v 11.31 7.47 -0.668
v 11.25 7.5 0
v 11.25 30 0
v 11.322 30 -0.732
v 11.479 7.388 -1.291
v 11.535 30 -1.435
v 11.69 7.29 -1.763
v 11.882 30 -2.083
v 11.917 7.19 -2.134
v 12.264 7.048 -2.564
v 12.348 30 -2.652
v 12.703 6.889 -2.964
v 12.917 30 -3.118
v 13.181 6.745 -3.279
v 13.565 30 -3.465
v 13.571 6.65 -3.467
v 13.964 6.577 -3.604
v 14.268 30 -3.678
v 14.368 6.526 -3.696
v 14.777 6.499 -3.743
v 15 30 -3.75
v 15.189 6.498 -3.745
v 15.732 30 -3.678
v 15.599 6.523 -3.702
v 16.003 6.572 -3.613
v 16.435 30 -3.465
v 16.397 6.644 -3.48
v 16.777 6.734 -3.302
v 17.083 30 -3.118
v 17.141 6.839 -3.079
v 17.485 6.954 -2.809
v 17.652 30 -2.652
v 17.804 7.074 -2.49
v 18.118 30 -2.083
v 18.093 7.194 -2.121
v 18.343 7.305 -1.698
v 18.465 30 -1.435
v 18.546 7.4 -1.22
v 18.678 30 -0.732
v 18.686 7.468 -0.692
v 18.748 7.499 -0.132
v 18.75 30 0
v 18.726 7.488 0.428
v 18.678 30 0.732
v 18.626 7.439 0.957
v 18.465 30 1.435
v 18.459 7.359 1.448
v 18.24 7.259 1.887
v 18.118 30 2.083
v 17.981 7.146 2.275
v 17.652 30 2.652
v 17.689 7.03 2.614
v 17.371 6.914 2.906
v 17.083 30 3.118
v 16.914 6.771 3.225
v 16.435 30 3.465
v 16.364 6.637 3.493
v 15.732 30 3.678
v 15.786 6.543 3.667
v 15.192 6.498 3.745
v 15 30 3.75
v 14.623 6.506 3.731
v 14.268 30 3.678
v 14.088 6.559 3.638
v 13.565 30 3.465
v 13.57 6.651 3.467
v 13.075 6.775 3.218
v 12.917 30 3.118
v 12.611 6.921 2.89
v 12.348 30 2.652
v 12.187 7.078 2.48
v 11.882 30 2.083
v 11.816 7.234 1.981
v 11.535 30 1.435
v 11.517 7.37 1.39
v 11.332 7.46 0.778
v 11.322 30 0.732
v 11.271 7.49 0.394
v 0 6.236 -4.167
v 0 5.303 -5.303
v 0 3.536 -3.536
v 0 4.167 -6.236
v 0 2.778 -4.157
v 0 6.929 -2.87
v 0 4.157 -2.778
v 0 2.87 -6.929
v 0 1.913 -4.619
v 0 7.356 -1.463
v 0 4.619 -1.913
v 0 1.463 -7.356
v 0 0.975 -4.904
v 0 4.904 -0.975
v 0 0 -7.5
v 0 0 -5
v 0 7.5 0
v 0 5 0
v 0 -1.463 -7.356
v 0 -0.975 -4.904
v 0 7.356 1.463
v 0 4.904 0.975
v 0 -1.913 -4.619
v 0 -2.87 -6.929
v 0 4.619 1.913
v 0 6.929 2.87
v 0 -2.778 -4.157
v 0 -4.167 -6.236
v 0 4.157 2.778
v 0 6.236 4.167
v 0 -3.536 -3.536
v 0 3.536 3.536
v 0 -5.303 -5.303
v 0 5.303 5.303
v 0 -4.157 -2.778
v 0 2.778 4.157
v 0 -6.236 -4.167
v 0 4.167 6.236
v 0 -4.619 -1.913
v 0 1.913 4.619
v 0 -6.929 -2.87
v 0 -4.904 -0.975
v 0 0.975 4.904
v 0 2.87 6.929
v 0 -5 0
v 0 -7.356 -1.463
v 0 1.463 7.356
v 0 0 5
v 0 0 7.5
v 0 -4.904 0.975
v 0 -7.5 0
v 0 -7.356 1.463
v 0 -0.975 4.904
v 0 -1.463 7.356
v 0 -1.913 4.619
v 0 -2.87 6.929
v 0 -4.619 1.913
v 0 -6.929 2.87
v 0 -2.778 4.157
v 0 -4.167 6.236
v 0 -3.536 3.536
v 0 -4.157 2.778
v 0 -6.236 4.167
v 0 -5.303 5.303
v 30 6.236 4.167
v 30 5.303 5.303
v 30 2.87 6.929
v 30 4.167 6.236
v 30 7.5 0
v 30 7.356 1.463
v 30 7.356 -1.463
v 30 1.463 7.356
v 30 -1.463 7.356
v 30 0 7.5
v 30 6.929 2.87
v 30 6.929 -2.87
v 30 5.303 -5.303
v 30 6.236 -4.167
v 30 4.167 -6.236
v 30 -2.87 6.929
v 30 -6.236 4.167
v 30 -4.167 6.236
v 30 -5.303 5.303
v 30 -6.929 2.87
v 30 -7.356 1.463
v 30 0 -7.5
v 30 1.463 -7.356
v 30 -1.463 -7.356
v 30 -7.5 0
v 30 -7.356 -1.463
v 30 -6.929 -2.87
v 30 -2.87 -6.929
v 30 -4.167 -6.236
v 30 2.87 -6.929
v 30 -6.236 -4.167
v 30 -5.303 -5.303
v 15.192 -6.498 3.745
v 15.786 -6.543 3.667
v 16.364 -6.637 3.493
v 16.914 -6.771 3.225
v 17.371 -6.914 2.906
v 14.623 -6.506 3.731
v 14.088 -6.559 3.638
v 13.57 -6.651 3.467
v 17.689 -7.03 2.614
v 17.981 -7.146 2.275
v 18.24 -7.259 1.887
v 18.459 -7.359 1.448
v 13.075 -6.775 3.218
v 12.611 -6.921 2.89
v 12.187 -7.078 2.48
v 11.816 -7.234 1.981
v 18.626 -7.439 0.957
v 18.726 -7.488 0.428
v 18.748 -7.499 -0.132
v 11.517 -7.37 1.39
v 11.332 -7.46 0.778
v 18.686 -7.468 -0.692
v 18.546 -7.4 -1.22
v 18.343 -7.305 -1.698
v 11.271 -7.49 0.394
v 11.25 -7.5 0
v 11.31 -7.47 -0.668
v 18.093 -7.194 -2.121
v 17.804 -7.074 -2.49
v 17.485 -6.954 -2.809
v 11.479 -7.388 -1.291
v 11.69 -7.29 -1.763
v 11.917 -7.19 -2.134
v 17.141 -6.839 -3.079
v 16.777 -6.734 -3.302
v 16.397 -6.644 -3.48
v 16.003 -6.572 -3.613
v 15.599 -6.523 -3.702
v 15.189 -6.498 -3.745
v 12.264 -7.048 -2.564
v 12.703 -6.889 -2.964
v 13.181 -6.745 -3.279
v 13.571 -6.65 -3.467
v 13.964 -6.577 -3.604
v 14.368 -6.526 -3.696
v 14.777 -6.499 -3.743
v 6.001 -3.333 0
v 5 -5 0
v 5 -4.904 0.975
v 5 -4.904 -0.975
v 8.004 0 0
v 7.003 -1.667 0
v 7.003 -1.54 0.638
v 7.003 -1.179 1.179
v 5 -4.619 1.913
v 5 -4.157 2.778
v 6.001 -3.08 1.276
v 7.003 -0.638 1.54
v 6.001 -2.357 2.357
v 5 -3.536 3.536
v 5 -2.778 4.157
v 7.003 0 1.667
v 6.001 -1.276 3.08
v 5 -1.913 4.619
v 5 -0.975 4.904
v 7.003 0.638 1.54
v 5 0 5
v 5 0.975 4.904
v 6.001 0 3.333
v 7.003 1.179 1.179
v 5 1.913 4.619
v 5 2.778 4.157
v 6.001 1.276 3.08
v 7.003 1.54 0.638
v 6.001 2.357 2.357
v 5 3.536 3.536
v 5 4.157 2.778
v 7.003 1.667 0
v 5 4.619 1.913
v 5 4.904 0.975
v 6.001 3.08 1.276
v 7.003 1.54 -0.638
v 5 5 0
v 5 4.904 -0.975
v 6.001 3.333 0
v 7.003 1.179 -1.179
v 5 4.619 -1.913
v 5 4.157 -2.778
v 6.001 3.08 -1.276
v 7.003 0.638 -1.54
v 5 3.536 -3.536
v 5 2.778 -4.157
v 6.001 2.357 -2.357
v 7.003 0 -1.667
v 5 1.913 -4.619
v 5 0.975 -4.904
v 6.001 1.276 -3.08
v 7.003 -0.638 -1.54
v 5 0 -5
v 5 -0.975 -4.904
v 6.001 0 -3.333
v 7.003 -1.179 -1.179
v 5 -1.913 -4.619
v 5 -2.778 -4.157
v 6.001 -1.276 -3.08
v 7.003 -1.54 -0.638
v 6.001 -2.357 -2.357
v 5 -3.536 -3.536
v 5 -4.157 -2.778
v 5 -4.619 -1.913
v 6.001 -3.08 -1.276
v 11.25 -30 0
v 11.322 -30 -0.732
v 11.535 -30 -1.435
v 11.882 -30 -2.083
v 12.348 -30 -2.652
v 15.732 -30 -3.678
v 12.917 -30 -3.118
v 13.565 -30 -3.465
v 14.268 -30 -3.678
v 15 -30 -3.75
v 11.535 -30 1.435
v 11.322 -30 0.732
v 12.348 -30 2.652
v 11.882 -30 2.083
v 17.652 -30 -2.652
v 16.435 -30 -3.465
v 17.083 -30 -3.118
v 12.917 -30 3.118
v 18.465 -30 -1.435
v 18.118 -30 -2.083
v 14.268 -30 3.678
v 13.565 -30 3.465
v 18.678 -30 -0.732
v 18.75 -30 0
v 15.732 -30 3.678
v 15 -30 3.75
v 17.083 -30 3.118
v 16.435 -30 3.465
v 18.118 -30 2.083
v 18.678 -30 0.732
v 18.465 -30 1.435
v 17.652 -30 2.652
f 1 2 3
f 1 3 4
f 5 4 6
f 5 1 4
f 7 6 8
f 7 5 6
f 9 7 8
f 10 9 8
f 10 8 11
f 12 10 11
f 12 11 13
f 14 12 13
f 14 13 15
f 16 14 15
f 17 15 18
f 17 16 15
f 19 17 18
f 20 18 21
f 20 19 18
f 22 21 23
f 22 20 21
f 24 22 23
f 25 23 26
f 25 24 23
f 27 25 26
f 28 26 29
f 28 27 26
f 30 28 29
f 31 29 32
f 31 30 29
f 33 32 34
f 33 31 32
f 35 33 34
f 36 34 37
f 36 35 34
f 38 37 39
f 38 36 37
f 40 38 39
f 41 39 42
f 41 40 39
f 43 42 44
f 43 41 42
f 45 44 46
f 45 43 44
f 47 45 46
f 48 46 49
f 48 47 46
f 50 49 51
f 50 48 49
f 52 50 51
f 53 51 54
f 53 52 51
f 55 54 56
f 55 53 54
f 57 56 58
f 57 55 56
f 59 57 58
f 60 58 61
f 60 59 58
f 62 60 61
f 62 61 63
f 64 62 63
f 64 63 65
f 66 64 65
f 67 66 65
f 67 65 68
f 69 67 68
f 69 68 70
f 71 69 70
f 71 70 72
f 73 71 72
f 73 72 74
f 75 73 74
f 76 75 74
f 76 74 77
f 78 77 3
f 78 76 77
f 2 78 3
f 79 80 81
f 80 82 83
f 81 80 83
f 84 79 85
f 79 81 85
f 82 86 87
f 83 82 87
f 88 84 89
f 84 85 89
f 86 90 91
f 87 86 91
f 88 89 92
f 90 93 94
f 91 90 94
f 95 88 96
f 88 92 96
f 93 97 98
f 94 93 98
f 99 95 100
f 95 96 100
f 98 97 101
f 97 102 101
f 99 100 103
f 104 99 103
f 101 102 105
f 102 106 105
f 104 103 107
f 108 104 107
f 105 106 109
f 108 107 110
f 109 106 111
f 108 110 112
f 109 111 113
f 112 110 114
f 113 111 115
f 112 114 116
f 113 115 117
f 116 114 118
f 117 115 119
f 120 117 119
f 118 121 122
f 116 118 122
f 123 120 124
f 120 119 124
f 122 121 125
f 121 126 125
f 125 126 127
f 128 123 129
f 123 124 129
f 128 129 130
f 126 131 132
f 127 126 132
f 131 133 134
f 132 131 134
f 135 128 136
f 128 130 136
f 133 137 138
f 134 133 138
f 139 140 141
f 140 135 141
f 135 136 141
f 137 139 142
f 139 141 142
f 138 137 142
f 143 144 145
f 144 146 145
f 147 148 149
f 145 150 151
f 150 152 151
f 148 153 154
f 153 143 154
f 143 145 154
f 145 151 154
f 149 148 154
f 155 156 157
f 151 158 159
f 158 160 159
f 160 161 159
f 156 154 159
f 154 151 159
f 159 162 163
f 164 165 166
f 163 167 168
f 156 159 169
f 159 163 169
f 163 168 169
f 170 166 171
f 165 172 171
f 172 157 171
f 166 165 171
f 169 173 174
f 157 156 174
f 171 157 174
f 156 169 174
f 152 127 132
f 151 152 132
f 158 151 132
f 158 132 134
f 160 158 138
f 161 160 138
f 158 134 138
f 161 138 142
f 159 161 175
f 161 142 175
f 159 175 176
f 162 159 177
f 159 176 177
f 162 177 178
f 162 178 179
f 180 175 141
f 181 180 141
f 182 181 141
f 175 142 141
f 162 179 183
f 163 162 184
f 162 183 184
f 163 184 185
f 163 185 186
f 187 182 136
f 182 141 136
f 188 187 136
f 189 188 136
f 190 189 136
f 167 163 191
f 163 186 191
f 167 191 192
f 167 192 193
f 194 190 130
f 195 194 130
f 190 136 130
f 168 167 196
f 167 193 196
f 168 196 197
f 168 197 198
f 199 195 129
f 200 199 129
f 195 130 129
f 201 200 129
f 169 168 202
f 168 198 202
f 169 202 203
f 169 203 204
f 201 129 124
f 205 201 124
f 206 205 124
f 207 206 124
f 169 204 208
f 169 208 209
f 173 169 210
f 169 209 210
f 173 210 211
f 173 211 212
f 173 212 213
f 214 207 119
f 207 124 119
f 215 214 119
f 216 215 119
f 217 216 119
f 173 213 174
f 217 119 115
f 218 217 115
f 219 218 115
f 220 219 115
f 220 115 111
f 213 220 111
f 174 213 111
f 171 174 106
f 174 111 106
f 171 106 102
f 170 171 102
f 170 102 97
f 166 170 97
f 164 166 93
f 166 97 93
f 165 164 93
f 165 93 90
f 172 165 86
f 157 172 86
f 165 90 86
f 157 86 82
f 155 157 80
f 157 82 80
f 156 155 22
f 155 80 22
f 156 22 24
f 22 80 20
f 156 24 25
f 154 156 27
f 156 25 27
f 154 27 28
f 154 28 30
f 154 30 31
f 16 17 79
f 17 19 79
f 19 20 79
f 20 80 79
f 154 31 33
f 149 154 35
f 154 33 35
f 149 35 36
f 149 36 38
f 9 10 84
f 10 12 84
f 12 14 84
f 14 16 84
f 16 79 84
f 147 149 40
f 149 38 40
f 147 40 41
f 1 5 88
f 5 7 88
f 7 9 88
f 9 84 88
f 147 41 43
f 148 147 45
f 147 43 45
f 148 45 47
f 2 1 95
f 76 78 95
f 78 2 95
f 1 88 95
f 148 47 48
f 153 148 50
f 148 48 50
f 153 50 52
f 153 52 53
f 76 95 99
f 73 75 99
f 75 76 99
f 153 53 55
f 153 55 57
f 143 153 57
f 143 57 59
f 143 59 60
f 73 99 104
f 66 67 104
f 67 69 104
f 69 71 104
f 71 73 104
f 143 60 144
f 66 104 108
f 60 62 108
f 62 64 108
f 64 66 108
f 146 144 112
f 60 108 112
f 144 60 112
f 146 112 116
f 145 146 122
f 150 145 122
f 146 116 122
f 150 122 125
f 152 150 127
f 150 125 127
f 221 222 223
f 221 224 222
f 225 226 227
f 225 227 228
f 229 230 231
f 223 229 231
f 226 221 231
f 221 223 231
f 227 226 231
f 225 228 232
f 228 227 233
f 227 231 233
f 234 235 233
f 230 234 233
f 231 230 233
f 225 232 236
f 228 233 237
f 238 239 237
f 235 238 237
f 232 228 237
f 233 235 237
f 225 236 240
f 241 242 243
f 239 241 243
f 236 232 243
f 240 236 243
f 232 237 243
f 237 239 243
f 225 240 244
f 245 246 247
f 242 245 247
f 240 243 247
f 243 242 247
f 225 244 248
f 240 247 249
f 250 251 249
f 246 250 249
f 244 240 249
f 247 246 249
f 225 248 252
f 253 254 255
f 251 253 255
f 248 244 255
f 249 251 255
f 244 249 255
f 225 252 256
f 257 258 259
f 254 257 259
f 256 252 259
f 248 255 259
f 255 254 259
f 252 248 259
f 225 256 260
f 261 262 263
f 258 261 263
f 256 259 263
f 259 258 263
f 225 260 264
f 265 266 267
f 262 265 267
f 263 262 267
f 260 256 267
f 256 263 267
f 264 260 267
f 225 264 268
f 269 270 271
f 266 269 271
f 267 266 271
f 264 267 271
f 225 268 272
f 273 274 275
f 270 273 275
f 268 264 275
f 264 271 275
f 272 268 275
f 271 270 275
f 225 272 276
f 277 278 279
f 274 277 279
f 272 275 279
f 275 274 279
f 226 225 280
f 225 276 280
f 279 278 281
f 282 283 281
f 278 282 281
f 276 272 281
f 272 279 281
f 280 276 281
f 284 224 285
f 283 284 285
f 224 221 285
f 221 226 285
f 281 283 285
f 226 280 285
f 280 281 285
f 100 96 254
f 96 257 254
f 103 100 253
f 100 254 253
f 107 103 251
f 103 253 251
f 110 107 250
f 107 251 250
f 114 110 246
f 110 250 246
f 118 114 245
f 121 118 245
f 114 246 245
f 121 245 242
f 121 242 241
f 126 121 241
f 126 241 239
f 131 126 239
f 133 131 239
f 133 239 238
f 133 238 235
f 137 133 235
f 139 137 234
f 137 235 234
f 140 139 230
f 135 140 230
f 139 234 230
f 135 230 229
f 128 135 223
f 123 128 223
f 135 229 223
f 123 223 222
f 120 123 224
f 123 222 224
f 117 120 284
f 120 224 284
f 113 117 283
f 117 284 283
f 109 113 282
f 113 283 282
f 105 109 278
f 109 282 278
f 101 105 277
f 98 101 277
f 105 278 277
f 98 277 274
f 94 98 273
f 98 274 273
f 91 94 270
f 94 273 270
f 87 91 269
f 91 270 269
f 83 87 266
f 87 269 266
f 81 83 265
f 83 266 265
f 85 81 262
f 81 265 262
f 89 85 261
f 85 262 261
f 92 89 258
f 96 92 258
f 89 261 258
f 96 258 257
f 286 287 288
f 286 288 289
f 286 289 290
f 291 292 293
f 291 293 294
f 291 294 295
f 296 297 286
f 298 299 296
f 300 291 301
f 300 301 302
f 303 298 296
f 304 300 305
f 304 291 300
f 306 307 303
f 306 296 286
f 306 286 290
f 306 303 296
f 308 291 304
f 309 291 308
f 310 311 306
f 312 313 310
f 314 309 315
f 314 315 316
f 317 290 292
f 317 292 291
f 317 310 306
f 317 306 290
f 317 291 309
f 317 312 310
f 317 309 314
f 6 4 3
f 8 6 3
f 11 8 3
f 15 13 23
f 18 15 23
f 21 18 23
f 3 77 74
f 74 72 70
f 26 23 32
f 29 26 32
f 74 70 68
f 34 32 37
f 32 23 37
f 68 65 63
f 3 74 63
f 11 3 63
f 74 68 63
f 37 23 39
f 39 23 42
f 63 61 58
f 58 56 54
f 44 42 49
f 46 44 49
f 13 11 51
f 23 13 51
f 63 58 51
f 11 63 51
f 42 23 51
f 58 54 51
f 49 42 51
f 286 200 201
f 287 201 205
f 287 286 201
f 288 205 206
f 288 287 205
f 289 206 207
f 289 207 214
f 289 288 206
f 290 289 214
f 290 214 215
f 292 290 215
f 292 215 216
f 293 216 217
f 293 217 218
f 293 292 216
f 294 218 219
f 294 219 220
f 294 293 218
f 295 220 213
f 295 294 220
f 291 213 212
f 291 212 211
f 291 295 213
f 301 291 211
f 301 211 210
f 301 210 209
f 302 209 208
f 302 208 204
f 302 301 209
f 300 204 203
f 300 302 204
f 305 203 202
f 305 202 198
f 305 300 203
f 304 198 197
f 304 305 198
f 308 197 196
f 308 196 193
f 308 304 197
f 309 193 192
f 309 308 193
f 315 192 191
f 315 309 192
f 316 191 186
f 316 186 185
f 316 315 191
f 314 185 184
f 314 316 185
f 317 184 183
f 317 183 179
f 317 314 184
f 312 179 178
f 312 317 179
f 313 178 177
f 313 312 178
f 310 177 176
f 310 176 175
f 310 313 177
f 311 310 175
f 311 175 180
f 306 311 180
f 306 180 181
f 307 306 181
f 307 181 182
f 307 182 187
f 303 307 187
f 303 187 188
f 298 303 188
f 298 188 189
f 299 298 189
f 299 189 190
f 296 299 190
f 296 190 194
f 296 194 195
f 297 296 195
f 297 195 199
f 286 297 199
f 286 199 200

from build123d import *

# Parameters (mm, degrees)
F3_D     = 10
F3_DEPTH = 5
F3_TIP   = 3.0043030951
F4_DEPTH = 30


with BuildPart() as f1:
    # F0 (on Front) → F1 (revolve)
    with BuildSketch(Plane.XZ):
        with BuildLine():
            ThreePointArc((11.25, 0), (15, 3.75), (18.75, 0))
            Line((18.75, 0), (30, 0))
            Line((30, 0), (30, 7.5))
            Line((30, 7.5), (0, 7.5))
            Line((0, 7.5), (0, 0))
            Line((0, 0), (11.25, 0))
        make_face()
        with BuildLine():
            ThreePointArc((11.25, 0), (15, -3.75), (18.75, 0))
            Line((18.75, 0), (11.25, 0))
        make_face()
        with BuildLine():
            Line((11.25, 0), (18.75, 0))
            ThreePointArc((18.75, 0), (15, 3.75), (11.25, 0))
        make_face()
    revolve(axis=Axis((15, 0, 0), (1, 0, 0)))

    # F3
    with Locations(Plane(origin=(0, 0, 0), x_dir=(0, -1, 0), z_dir=(-1, 0, 0))):
        with Locations((0, 0)):
            Hole(F3_D / 2, depth=F3_DEPTH)
            with Locations((0, 0, -(F3_DEPTH + F3_TIP / 2))):  # 118° drill point
                Cone(0, F3_D / 2, F3_TIP, mode=Mode.SUBTRACT)

    # F0 (on Front) → F4 (join, symmetric)
    with BuildSketch(Plane.XZ):
        with BuildLine():
            Line((11.25, 0), (18.75, 0))
            ThreePointArc((18.75, 0), (15, 3.75), (11.25, 0))
        make_face()
        with BuildLine():
            ThreePointArc((11.25, 0), (15, -3.75), (18.75, 0))
            Line((18.75, 0), (11.25, 0))
        make_face()
    extrude(amount=F4_DEPTH, both=True)


solid = f1.part
